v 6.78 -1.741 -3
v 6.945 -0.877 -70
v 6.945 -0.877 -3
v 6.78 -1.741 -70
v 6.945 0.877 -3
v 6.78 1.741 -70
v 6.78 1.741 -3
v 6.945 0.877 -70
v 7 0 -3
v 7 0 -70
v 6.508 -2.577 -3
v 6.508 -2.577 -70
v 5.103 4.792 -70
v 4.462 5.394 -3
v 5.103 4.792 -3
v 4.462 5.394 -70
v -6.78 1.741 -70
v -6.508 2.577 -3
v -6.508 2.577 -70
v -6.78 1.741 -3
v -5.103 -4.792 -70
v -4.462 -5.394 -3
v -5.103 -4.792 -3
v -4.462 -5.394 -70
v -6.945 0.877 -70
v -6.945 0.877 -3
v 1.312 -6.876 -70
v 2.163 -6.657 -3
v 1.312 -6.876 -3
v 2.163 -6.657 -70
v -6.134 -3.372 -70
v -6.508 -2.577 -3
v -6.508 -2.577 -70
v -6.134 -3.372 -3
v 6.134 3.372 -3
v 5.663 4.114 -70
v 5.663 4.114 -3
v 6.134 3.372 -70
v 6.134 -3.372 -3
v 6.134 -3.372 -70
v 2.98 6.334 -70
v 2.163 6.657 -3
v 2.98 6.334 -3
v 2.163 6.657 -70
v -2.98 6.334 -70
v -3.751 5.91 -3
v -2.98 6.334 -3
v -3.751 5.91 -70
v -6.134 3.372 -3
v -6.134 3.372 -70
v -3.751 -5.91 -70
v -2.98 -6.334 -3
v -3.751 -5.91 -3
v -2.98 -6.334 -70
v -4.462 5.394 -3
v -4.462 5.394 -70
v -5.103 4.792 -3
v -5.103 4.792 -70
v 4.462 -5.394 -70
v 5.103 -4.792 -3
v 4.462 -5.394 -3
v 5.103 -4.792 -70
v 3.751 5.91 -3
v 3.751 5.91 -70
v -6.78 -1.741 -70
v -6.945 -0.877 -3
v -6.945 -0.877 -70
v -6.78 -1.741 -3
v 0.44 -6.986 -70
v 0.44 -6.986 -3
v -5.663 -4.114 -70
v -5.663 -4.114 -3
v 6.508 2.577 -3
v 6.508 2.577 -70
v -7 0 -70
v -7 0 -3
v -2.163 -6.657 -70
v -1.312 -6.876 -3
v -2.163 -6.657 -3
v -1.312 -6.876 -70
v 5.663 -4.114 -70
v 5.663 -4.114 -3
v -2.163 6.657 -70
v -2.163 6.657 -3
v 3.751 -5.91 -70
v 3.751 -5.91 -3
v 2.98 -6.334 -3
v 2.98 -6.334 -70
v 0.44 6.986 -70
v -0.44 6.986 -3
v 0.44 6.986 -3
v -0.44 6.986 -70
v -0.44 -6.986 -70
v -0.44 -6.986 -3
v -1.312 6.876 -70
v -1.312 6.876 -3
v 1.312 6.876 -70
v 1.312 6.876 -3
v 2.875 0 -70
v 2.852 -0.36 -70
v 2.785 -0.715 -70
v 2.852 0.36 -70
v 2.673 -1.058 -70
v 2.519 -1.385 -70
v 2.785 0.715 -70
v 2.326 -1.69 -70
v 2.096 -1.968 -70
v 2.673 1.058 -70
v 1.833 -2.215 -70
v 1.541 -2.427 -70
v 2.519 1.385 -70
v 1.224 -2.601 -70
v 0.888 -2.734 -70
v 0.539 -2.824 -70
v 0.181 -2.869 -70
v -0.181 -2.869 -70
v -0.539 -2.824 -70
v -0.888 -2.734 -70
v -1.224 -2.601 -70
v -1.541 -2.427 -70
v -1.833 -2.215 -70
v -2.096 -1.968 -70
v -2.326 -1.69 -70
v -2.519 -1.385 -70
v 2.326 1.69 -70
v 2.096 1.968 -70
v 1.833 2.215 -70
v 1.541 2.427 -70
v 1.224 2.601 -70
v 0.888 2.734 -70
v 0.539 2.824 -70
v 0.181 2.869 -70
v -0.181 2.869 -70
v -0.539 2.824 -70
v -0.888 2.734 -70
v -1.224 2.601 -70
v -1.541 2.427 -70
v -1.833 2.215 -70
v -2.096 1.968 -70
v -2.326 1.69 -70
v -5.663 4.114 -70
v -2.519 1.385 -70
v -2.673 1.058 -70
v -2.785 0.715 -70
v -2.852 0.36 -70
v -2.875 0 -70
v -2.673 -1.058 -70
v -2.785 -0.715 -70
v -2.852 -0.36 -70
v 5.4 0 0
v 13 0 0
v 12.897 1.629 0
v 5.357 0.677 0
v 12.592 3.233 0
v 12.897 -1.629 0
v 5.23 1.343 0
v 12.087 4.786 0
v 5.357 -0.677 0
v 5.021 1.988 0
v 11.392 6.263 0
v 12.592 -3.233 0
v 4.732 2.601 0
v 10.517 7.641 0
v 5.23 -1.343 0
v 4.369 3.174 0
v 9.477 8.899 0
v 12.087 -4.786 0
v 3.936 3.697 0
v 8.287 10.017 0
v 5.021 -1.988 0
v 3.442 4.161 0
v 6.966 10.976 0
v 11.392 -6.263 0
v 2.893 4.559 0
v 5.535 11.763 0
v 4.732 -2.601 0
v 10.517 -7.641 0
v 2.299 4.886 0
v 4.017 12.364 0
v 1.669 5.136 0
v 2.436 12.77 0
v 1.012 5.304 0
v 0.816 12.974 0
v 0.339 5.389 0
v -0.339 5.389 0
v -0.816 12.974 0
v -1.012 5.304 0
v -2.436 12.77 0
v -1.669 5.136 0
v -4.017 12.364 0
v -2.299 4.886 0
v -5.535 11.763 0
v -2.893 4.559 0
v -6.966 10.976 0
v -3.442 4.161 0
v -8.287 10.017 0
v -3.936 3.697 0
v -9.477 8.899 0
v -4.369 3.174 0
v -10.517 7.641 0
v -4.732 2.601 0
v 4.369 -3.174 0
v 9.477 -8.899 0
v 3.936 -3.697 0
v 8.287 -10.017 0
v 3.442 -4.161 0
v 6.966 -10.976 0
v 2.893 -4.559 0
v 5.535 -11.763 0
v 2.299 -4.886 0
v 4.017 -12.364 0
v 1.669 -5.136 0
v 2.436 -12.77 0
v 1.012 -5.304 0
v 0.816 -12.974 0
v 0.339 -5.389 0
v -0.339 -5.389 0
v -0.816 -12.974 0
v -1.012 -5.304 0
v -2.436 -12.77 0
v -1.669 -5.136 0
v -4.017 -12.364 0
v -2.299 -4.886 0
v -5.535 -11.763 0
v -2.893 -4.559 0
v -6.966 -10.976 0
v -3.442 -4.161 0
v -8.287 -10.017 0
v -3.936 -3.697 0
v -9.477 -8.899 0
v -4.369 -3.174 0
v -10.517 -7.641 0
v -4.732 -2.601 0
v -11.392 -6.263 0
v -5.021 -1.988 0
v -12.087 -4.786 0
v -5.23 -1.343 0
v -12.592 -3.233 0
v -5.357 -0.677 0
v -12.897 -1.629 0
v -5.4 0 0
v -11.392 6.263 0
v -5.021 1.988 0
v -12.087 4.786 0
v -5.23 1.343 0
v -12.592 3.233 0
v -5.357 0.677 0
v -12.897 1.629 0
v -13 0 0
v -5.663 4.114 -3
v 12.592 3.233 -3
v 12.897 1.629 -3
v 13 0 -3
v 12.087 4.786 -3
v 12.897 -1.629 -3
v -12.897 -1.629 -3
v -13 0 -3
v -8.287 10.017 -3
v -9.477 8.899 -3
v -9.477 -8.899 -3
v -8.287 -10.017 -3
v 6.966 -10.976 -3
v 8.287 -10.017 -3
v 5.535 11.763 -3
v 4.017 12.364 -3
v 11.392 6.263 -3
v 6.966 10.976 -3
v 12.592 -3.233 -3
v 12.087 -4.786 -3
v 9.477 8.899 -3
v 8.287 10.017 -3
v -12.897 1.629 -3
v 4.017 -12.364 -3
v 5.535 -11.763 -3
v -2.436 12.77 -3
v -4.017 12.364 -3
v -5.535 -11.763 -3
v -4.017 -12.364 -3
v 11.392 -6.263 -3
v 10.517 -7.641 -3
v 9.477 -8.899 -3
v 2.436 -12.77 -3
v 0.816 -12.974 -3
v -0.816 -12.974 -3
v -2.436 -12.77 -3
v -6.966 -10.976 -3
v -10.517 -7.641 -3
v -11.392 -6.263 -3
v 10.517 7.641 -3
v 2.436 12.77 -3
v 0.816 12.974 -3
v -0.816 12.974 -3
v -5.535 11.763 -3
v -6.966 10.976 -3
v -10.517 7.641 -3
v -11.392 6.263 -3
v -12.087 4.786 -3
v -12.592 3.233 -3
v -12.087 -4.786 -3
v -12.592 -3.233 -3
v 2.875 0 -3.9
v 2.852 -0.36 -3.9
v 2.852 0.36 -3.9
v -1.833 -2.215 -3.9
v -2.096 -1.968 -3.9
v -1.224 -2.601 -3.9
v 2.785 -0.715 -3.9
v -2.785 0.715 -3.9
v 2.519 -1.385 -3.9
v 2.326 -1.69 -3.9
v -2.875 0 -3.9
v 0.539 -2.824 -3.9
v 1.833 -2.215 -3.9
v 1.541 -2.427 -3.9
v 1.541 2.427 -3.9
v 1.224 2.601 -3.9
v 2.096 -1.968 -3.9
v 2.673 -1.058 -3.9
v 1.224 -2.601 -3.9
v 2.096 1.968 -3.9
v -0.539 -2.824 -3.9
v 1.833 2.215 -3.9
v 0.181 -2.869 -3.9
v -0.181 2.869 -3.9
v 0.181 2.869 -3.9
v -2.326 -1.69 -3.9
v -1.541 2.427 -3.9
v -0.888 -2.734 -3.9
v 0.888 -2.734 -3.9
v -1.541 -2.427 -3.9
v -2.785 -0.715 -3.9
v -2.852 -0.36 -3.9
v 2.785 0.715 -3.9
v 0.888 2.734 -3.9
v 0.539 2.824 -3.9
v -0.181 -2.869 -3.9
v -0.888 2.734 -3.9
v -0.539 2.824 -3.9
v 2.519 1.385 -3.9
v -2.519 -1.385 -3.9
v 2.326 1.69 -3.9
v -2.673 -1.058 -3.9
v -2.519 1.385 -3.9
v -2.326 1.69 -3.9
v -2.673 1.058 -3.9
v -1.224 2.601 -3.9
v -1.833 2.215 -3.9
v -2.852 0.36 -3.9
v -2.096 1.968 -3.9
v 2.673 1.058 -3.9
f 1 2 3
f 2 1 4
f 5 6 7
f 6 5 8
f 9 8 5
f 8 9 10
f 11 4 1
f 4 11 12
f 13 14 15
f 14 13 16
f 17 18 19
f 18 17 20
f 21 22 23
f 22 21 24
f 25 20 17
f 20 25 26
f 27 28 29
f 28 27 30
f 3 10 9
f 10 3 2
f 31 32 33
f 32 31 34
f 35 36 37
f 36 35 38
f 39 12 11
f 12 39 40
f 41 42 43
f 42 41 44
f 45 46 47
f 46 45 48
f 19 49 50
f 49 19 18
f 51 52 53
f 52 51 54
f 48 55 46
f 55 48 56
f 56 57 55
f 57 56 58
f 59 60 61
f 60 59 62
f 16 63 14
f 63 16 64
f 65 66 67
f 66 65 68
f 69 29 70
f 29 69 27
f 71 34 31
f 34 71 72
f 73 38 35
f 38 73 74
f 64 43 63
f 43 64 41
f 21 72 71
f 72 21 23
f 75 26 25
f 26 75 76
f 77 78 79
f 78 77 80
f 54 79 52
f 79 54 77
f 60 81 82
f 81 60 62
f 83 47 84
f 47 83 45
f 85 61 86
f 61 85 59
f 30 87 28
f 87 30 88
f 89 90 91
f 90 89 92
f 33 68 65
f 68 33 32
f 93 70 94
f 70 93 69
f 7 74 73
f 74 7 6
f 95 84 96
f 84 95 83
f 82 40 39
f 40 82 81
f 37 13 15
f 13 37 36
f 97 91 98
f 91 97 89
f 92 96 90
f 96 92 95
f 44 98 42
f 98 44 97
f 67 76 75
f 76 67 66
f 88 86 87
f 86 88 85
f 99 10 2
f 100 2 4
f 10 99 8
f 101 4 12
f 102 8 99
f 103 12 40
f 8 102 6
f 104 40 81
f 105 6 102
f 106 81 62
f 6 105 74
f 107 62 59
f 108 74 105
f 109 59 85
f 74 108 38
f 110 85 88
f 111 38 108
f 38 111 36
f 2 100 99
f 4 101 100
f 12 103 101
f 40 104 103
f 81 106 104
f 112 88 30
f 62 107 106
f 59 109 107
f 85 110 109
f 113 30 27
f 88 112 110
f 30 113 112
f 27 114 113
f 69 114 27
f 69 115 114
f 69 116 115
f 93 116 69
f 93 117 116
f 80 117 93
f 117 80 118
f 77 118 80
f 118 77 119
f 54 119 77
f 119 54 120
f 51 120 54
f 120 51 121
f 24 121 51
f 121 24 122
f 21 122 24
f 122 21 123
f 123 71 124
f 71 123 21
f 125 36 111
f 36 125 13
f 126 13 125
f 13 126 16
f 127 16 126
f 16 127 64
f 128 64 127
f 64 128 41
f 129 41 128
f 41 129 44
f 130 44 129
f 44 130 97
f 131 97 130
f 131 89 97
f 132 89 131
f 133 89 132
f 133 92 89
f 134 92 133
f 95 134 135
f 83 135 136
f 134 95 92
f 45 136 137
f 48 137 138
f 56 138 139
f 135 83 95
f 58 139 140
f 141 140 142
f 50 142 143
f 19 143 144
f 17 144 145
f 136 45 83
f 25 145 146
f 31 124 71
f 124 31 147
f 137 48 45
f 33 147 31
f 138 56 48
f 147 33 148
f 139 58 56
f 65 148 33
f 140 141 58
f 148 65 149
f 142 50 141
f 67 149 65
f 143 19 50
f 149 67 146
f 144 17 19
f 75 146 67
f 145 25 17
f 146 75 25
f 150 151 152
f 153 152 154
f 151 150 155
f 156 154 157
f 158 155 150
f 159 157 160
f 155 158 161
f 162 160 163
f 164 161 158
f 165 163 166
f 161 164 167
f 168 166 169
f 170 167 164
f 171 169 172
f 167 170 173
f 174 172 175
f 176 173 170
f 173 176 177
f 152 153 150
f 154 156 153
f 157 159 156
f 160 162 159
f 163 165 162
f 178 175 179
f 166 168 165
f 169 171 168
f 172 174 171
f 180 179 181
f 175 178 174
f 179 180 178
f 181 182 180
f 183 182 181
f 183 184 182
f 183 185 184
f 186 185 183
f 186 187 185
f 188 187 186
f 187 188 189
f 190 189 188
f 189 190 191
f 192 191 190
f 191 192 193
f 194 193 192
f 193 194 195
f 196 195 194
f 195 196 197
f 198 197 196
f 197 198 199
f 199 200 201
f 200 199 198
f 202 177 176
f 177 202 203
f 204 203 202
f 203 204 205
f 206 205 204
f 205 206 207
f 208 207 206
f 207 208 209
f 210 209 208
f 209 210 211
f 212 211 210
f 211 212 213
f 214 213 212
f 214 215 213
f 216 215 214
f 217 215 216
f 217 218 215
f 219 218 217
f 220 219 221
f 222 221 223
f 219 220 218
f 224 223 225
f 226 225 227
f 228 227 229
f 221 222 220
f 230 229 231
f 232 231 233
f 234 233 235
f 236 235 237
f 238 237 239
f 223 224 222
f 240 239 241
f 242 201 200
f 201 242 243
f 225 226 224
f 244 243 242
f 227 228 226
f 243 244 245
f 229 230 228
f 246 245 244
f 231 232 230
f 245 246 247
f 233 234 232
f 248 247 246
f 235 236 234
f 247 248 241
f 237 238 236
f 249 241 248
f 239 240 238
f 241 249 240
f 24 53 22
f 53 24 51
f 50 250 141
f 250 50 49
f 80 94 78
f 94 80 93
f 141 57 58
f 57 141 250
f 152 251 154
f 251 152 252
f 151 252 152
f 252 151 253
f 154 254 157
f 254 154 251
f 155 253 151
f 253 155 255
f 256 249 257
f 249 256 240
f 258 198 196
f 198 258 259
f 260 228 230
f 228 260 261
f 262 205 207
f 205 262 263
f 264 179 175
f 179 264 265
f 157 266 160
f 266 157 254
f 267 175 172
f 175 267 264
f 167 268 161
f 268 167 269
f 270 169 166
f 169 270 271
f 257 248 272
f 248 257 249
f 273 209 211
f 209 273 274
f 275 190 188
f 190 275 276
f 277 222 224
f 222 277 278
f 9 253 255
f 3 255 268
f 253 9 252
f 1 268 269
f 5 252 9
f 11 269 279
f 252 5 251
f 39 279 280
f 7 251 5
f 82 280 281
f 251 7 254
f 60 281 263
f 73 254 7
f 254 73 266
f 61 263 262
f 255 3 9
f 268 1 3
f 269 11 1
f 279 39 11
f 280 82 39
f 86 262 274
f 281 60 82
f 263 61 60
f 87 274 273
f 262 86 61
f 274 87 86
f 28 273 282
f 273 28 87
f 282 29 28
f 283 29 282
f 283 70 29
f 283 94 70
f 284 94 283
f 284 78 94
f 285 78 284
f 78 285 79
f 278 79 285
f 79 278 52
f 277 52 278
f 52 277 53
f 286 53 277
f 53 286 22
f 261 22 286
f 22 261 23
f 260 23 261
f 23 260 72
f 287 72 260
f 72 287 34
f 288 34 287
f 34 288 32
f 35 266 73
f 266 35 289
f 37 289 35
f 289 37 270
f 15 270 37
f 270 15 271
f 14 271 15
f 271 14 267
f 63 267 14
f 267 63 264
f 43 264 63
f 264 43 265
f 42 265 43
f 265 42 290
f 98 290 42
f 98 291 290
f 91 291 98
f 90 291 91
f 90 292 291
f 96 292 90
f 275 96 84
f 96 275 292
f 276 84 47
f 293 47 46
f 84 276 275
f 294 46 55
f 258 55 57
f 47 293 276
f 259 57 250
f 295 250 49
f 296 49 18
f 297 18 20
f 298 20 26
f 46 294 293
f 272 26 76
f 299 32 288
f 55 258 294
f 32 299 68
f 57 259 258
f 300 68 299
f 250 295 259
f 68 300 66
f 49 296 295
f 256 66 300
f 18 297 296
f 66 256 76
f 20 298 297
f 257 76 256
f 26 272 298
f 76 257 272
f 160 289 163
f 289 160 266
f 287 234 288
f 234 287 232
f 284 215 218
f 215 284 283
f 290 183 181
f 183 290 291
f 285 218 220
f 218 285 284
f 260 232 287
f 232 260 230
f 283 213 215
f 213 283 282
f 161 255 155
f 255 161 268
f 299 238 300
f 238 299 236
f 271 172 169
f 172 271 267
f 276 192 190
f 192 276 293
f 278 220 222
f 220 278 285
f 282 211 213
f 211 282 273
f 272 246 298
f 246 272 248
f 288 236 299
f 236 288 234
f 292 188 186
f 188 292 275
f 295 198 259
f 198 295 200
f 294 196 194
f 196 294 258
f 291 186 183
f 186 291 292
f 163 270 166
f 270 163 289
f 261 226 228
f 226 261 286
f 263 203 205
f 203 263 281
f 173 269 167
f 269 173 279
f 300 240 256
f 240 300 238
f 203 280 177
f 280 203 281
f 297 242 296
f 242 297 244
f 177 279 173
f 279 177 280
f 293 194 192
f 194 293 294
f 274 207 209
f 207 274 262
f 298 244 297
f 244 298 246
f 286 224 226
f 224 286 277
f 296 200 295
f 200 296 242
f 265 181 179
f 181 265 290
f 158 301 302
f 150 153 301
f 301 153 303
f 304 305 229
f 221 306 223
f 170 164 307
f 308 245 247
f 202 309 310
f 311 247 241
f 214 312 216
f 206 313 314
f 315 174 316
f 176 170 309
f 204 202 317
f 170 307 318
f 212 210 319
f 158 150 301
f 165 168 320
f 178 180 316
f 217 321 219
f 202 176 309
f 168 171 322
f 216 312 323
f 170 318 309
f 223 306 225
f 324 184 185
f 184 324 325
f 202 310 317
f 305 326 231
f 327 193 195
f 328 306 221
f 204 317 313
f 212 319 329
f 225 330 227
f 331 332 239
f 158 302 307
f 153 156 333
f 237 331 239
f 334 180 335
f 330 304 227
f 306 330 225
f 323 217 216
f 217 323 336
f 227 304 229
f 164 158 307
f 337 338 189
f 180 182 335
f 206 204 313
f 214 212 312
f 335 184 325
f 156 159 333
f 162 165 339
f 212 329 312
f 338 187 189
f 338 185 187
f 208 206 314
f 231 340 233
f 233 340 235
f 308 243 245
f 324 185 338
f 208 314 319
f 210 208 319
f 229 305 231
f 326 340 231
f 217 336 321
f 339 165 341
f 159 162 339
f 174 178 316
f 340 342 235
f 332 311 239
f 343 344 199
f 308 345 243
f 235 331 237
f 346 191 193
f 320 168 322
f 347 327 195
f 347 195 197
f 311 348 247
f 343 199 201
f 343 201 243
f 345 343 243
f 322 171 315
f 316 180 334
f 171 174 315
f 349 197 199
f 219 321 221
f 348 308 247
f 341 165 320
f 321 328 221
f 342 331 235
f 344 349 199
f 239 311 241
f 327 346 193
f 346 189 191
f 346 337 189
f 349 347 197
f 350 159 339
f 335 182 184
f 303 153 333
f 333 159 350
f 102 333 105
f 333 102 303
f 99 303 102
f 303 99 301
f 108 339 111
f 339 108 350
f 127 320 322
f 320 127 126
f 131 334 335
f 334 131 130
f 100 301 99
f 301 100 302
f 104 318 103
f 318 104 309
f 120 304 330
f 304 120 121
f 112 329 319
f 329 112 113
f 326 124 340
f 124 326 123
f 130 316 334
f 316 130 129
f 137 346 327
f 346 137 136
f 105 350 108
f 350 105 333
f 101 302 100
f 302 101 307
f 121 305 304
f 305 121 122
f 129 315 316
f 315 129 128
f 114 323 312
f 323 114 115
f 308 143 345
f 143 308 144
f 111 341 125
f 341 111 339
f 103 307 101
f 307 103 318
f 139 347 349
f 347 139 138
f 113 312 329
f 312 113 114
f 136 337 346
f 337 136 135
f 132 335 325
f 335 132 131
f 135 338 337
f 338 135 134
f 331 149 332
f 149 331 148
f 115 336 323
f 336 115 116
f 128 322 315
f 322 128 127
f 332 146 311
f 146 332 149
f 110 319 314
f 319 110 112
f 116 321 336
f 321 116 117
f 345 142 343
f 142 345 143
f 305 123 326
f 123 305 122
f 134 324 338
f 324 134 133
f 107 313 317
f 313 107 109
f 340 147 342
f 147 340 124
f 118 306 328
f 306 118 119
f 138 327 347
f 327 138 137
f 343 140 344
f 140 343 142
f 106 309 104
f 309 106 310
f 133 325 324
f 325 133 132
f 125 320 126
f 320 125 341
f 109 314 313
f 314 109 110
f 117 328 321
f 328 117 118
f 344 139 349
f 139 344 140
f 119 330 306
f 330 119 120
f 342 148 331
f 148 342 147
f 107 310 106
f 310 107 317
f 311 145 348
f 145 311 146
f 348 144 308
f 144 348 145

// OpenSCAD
$fn = 50;


difference() {
	union() {
		translate(v = [0, 0, -70.0000000000]) {
			cylinder(h = 70, r = 7.0000000000);
		}
		translate(v = [0, 0, -3.0000000000]) {
			cylinder(h = 3, r = 13.0000000000);
		}
	}
	union() {
		translate(v = [0, 0, 0]) {
			rotate(a = [0, 0, 0]) {
				difference() {
					union() {
						#translate(v = [0, 0, -70.0000000000]) {
							cylinder(h = 70, r = 2.6000000000);
						}
						#translate(v = [0, 0, -3.9000000000]) {
							cylinder(h = 3.9000000000, r1 = 2.8750000000, r2 = 5.4000000000);
						}
						#translate(v = [0, 0, -70.0000000000]) {
							cylinder(h = 70, r = 2.8750000000);
						}
						#translate(v = [0, 0, -70.0000000000]) {
							cylinder(h = 70, r = 2.6000000000);
						}
					}
					union();
				}
			}
		}
	}
}
